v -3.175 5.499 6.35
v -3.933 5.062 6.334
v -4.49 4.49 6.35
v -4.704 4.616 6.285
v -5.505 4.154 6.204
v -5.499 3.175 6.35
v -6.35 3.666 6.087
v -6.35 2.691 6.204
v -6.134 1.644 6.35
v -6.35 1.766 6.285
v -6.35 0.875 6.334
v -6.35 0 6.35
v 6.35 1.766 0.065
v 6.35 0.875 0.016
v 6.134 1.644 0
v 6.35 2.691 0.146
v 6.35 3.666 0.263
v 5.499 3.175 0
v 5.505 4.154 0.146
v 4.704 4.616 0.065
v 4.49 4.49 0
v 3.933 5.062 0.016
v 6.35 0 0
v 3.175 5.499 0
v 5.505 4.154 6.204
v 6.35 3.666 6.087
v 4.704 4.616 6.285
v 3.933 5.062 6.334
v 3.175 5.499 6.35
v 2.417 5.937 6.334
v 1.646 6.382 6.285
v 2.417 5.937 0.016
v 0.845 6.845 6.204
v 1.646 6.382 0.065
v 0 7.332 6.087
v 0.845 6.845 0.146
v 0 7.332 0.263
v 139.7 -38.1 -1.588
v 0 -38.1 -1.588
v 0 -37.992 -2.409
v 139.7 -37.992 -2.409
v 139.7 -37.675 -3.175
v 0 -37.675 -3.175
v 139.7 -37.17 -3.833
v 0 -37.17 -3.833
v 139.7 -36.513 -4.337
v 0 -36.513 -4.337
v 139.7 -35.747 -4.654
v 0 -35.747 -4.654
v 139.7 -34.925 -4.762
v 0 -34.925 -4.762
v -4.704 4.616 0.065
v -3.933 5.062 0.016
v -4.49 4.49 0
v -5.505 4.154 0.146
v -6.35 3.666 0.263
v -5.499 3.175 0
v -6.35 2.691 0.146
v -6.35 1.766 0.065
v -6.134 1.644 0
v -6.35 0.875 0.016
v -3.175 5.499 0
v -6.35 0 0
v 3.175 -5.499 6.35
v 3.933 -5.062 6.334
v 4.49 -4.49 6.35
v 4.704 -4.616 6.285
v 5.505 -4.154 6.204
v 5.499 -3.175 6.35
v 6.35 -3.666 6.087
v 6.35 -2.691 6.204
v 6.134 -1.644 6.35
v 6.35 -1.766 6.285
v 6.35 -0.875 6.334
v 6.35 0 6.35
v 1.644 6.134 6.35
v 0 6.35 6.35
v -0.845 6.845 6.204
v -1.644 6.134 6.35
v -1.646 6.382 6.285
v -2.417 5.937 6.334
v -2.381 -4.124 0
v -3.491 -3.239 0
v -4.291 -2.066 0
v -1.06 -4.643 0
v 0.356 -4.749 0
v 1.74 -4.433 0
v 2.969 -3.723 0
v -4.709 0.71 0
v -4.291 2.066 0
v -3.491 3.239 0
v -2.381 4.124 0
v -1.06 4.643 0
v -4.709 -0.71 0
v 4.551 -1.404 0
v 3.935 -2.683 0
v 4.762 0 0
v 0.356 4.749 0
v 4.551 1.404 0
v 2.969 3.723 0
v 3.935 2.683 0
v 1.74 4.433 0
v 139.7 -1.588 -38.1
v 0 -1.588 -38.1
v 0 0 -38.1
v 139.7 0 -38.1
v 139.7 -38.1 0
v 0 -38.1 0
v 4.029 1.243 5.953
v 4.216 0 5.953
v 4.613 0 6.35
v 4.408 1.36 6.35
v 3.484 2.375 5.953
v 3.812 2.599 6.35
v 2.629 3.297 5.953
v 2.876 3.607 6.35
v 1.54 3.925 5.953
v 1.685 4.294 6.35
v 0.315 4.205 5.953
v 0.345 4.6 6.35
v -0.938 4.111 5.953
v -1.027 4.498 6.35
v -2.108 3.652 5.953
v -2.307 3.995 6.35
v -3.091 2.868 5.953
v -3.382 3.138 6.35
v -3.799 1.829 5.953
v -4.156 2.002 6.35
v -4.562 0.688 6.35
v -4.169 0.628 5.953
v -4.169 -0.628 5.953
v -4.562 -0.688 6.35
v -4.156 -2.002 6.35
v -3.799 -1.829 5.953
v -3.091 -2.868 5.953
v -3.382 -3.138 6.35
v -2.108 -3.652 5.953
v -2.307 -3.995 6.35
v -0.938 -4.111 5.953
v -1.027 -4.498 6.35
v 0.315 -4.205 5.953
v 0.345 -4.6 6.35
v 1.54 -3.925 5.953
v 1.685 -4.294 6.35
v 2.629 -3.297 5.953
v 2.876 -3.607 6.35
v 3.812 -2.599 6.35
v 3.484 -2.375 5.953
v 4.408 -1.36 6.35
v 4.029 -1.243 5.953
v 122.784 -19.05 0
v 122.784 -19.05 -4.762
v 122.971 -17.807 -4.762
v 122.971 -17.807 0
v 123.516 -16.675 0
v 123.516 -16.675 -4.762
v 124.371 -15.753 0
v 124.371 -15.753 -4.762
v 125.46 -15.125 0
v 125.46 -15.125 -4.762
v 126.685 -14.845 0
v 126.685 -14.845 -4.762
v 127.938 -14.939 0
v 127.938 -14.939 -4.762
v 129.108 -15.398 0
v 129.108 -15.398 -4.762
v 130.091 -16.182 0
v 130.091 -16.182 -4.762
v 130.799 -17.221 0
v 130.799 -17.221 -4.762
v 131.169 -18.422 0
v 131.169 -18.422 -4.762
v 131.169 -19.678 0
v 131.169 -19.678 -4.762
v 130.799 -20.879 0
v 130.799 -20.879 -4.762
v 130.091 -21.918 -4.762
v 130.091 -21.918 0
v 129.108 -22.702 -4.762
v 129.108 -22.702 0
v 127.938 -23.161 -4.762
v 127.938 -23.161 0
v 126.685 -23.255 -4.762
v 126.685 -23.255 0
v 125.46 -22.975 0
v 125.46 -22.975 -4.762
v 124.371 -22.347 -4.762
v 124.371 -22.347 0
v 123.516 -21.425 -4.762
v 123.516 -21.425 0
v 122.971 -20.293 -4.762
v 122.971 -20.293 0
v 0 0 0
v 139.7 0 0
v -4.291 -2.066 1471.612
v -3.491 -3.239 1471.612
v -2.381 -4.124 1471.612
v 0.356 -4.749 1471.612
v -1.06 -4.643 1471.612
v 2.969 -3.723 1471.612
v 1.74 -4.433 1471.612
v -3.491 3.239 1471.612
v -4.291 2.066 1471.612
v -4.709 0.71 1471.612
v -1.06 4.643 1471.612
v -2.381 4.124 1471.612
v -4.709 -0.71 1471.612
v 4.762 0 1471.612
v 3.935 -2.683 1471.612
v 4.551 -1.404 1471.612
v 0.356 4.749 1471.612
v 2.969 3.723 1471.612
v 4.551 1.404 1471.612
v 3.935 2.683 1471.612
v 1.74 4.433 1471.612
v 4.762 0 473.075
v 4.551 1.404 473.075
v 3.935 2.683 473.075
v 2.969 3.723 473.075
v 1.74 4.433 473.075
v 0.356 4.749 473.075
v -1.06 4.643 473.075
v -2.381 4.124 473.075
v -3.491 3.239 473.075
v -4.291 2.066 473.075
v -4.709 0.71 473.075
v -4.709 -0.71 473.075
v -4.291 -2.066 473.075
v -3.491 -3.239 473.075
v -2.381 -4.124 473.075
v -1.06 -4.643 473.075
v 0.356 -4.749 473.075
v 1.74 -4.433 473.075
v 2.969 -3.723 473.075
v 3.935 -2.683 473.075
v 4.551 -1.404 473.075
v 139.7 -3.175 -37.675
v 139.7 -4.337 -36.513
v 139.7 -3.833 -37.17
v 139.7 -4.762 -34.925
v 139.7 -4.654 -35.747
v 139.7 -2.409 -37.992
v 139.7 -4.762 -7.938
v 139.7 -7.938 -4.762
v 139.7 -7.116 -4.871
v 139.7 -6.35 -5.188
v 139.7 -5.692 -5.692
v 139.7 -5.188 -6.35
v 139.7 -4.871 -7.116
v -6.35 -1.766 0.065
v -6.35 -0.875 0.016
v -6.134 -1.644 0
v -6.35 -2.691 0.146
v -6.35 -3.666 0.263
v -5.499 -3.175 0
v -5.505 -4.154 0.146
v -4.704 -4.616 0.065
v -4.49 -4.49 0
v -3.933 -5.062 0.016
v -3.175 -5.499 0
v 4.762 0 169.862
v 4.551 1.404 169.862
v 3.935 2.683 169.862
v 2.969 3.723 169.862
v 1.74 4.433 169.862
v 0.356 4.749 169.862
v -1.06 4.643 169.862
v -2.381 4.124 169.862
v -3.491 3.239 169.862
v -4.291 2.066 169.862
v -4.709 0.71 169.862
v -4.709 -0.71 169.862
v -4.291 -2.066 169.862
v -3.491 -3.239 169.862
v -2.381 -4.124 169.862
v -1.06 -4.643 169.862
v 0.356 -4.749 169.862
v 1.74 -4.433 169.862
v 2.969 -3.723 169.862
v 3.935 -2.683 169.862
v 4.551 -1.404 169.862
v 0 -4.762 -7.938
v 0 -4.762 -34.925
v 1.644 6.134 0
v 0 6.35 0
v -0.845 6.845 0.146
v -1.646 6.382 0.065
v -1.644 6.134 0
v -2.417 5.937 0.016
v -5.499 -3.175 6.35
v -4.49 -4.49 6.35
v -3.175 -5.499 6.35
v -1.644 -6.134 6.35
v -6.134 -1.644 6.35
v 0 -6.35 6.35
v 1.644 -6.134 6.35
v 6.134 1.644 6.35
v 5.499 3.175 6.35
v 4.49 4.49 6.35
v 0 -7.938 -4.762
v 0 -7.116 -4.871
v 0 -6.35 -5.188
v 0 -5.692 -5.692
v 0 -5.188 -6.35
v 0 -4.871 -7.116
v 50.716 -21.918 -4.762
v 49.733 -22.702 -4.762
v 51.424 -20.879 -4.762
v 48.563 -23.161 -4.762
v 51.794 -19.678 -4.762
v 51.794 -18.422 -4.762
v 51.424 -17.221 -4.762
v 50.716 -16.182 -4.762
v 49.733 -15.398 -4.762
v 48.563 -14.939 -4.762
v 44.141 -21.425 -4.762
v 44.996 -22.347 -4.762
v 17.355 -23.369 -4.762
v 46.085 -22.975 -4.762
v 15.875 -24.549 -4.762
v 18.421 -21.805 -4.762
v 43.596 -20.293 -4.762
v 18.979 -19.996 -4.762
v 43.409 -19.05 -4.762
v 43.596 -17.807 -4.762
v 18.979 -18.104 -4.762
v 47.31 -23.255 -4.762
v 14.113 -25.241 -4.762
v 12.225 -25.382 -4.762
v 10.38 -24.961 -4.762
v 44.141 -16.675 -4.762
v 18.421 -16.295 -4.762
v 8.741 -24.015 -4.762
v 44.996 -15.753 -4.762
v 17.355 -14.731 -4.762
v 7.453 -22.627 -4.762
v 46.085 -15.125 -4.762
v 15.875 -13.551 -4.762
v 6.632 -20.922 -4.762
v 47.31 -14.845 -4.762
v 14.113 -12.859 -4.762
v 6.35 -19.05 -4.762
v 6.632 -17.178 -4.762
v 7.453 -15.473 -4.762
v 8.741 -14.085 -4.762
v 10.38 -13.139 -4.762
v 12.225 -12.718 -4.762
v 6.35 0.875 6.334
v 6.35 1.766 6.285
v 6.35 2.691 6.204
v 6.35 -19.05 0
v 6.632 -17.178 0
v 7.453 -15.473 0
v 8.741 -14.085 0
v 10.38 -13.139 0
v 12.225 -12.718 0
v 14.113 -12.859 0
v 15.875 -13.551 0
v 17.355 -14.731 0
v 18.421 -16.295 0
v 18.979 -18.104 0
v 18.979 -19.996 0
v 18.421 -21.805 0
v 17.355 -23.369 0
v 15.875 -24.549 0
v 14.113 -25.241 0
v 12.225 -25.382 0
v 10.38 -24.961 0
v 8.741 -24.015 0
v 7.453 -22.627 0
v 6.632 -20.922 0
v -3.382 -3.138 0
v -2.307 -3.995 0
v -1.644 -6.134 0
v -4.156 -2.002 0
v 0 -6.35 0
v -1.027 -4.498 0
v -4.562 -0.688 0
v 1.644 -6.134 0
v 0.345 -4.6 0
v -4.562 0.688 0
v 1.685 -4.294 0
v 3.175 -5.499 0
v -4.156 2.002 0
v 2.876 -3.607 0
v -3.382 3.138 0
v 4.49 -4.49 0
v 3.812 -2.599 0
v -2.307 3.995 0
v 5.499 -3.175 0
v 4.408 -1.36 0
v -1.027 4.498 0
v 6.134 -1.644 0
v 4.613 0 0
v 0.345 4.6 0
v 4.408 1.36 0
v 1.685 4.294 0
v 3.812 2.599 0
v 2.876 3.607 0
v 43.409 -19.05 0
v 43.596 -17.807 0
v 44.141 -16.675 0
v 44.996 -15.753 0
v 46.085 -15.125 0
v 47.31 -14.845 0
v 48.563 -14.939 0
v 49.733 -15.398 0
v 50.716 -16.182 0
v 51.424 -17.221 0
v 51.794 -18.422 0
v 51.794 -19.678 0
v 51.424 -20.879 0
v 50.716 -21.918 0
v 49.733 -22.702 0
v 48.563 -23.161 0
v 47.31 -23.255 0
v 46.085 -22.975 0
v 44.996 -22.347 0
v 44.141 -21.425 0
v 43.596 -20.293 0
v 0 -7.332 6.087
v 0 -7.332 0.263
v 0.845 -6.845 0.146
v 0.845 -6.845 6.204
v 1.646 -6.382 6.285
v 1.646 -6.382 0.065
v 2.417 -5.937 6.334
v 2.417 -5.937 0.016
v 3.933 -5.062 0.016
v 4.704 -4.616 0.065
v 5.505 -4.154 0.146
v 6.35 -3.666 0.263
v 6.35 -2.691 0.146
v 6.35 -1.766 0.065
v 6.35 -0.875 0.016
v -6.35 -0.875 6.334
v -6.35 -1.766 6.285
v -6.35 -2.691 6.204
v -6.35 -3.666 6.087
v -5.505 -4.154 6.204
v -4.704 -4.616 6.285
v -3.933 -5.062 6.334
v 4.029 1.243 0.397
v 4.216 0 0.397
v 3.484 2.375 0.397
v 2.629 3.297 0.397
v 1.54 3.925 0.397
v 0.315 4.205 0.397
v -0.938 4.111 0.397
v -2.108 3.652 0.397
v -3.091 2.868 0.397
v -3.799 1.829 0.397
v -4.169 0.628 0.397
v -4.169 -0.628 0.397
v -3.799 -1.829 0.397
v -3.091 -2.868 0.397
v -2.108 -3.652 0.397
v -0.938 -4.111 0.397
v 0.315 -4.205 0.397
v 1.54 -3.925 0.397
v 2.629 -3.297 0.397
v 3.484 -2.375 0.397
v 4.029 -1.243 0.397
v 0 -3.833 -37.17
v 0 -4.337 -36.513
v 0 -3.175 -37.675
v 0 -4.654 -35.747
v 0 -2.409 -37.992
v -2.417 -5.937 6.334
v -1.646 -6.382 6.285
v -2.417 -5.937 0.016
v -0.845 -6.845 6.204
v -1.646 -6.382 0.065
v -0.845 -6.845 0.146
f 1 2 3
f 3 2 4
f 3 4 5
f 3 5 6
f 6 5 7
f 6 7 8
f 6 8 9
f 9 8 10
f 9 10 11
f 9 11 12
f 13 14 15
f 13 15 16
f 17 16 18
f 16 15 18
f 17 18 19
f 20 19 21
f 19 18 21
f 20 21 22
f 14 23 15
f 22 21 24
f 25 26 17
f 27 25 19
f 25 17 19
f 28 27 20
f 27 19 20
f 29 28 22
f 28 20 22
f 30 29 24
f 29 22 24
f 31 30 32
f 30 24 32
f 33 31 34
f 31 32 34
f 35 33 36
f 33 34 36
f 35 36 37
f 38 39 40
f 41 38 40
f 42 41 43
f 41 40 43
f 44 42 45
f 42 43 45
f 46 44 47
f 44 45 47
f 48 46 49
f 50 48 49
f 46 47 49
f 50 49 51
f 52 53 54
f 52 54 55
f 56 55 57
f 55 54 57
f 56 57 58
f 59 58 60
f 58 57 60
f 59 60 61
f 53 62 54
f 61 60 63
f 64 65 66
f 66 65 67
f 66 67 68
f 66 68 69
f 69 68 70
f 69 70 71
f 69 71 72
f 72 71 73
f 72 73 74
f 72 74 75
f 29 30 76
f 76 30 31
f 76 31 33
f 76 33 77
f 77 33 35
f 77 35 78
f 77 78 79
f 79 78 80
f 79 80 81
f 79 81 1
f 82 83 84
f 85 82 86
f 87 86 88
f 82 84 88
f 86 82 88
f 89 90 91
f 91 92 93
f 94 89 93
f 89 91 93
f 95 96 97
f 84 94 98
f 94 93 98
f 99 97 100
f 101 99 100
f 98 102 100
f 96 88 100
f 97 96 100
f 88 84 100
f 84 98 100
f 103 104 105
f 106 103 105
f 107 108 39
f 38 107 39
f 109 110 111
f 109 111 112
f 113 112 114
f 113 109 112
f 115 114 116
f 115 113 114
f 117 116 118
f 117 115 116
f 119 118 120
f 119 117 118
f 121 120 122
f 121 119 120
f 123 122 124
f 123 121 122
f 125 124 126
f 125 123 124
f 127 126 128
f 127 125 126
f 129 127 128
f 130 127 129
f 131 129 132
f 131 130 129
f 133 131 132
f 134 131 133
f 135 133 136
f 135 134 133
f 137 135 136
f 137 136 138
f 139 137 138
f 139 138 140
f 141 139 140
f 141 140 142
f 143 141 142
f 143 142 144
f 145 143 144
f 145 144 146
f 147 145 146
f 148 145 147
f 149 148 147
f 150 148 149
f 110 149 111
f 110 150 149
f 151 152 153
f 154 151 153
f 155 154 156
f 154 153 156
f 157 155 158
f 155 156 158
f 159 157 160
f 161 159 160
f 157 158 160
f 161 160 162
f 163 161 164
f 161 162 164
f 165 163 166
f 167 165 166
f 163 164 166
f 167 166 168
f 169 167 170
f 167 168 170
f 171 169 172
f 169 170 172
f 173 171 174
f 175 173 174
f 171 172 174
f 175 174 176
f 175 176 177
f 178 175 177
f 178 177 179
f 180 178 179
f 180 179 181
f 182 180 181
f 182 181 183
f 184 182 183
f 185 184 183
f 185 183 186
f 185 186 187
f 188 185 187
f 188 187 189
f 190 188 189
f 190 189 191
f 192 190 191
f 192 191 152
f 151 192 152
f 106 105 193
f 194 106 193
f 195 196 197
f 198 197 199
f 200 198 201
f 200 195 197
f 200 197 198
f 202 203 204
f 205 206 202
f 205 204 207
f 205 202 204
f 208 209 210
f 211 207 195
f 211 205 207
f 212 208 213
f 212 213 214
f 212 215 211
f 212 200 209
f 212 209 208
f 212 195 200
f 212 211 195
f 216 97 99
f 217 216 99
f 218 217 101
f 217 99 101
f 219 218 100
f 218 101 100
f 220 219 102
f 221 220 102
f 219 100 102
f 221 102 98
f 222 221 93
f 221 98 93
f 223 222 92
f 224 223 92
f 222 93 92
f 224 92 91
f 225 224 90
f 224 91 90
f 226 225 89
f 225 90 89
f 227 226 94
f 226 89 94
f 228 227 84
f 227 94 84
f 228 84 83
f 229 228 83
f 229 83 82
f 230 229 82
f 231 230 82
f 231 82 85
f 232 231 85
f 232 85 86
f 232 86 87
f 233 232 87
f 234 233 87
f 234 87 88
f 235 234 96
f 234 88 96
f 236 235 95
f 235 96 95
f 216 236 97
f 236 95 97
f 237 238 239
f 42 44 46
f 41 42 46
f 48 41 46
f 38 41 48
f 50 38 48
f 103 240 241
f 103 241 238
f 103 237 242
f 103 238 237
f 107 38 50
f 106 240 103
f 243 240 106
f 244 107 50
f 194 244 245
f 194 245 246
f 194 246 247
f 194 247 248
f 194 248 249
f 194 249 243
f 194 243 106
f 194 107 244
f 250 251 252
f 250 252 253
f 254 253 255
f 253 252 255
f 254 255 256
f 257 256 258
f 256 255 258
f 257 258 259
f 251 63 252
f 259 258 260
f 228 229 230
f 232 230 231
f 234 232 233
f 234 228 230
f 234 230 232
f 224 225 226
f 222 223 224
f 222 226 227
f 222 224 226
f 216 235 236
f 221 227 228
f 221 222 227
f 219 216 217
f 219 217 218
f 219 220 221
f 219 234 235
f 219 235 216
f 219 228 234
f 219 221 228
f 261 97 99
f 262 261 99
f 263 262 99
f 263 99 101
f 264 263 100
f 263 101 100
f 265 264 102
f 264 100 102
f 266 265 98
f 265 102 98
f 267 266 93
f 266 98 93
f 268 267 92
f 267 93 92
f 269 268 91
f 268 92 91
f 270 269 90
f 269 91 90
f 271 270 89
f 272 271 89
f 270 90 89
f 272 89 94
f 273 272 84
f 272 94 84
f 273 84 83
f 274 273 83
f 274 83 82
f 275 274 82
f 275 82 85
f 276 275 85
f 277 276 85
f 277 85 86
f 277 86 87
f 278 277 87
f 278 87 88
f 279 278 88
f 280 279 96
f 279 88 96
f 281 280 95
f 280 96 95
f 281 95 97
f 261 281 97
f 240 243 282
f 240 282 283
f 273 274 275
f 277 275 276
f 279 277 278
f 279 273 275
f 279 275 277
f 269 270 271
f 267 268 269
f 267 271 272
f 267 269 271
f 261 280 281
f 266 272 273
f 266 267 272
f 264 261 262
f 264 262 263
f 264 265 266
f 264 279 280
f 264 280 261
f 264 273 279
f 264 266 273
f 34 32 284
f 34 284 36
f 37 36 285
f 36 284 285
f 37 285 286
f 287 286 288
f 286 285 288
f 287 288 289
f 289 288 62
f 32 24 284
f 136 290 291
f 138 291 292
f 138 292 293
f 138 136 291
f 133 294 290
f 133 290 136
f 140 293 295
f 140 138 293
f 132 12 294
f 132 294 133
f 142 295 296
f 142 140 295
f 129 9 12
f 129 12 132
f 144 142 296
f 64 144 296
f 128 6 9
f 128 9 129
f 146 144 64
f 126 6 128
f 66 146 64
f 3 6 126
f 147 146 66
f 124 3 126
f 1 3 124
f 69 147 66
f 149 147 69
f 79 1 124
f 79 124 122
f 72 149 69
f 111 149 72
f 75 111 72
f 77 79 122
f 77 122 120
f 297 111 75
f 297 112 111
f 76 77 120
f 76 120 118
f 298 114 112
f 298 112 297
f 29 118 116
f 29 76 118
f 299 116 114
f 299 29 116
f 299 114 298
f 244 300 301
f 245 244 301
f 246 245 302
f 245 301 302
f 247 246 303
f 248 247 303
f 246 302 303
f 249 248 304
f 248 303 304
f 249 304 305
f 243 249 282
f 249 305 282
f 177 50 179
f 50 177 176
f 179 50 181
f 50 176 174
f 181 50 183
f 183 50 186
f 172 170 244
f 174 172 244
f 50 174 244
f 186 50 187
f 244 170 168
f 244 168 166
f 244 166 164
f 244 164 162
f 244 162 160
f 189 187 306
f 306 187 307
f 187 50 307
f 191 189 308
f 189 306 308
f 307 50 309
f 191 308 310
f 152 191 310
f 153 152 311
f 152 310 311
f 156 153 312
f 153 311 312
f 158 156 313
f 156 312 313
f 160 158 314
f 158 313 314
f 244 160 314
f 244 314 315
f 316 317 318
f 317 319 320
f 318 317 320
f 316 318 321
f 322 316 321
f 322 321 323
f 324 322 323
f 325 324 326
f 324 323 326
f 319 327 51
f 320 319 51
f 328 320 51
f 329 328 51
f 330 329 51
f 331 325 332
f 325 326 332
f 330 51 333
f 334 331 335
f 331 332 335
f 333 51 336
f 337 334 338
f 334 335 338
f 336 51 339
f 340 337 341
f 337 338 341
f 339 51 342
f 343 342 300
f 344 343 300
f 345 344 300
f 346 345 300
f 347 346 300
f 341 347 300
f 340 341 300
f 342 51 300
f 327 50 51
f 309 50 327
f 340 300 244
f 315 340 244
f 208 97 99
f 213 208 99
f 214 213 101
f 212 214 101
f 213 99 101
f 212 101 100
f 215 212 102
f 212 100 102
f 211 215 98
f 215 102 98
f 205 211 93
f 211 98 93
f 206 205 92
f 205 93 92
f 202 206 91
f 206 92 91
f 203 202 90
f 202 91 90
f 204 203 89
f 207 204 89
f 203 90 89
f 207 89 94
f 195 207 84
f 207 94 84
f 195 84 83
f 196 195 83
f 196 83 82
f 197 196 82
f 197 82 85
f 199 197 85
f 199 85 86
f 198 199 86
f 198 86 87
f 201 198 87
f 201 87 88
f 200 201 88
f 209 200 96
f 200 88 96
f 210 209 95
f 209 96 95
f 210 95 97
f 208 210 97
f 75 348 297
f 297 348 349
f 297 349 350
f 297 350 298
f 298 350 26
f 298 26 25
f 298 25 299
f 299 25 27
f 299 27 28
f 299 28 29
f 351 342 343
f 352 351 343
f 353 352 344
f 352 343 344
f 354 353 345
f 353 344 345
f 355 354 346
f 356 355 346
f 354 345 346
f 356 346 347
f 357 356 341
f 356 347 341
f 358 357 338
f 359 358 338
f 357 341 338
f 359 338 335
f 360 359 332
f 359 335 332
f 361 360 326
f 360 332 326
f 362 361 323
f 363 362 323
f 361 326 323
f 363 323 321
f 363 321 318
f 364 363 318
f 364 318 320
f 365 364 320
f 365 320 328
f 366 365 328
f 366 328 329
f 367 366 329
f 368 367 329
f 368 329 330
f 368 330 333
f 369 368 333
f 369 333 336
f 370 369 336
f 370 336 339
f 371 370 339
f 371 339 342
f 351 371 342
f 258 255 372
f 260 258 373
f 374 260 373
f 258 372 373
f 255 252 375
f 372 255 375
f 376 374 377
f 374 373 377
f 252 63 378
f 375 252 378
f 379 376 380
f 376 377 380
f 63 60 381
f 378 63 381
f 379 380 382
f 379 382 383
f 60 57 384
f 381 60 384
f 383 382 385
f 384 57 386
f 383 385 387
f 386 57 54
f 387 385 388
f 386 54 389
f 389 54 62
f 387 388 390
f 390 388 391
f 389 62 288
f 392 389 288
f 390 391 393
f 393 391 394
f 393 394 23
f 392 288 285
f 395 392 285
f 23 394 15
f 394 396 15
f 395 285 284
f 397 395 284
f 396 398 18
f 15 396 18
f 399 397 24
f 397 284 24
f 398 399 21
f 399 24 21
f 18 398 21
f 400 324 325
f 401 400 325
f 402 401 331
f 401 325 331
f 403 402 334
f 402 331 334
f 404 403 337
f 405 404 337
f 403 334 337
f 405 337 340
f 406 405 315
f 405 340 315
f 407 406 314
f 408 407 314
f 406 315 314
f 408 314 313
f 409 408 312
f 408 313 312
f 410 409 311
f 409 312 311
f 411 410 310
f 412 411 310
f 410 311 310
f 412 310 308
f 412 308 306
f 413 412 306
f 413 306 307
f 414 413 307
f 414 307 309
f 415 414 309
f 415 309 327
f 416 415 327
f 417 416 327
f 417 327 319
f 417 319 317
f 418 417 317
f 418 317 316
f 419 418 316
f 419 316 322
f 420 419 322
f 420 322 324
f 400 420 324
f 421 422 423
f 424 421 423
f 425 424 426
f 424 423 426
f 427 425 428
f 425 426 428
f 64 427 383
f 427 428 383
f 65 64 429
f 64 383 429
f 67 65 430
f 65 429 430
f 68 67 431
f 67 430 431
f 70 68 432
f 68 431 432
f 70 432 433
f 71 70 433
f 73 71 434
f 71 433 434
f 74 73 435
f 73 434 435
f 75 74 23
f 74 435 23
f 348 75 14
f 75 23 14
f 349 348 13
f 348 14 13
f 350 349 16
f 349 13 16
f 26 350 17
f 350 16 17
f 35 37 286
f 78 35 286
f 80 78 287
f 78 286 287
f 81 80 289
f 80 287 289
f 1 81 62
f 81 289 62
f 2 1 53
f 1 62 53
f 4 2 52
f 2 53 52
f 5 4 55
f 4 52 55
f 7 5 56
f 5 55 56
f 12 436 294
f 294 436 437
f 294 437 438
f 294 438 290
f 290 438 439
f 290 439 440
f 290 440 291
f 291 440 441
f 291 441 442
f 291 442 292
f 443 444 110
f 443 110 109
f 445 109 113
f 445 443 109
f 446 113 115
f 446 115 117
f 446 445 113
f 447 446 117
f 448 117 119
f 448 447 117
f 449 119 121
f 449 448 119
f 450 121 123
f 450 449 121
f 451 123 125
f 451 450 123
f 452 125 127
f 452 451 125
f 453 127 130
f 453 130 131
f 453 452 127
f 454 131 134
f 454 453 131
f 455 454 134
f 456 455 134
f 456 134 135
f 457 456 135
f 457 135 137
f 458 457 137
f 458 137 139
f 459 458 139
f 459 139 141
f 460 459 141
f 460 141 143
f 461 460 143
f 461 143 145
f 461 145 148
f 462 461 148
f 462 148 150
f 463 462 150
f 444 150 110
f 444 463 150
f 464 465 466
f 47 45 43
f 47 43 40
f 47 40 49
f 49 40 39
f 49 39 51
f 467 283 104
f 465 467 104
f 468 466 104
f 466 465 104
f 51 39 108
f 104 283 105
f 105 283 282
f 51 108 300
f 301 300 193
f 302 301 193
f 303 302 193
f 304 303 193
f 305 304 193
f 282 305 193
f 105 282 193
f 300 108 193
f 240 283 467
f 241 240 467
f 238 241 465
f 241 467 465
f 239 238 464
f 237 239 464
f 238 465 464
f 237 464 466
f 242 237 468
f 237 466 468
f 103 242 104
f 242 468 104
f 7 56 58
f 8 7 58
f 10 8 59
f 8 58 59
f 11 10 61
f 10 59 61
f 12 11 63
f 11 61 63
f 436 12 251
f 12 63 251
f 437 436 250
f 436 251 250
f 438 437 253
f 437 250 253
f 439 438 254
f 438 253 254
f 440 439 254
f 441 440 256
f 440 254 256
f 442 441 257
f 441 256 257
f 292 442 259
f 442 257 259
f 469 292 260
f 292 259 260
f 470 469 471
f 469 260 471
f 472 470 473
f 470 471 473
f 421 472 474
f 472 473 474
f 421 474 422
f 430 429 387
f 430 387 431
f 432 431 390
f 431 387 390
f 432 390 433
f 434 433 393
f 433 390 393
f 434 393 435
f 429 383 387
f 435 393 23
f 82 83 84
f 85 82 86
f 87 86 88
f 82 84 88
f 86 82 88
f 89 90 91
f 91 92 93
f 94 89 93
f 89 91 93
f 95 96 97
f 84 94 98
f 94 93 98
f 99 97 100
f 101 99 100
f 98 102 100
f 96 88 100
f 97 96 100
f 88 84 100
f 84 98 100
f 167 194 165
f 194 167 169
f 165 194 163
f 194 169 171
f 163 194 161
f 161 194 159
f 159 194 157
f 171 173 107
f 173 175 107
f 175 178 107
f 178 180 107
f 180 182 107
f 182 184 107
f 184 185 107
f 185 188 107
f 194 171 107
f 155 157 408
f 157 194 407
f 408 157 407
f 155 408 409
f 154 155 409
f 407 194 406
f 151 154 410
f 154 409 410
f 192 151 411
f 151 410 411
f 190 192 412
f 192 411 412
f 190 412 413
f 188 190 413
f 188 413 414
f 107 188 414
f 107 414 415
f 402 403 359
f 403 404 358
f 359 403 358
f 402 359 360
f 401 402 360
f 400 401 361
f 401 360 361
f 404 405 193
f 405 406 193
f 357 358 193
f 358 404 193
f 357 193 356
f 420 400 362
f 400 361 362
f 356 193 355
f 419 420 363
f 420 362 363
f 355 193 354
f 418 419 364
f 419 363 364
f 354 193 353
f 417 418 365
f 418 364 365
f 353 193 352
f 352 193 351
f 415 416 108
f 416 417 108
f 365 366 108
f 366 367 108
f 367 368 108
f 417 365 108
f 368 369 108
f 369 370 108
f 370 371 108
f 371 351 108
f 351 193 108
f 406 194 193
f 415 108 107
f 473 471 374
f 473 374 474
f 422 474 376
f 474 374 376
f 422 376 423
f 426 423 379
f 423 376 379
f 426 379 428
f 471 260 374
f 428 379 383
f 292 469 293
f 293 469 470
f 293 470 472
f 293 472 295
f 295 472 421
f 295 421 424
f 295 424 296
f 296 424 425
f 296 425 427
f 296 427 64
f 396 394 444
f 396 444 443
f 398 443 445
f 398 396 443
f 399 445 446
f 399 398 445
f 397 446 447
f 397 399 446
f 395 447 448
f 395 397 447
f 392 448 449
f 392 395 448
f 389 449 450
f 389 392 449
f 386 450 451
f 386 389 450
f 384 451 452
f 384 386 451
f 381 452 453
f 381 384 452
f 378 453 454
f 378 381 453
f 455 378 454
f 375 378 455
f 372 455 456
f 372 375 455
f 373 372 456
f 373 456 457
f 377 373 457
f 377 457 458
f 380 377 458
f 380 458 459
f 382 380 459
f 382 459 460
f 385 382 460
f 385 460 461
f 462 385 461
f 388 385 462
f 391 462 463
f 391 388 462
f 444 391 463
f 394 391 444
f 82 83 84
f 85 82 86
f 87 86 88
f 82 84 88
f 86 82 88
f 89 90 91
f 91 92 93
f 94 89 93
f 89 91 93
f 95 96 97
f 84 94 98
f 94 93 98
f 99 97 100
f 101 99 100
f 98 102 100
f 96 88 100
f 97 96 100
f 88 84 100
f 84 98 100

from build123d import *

# Parameters (mm, degrees)
F1_DEPTH  = 139.7
F3_D      = 8.4328
F4_D      = 12.7
F5_R      = 4.7625
F6_DEPTH  = 169.8625
F7_DEPTH  = 1471.6125
F8_DEPTH  = 473.075
F9_R      = 4.2164
F10_DEPTH = 6.35
F13_SIZE2 = 0.396875
F13_SIZE  = 0.396875


# Not quite as in the source:
# - a length typed as a fraction of an inch, garbled in the dataset ("3 / 203.2 mm" for 3/8 in), is restored


with BuildPart() as f1:
    # F0 (on Right) → F1 (new body)
    with BuildSketch(Plane.YZ):
        with BuildLine():
            Line((0, -38.1), (0, 0))
            Line((0, 0), (-38.1, 0))
            Line((-38.1, 0), (-38.1, -1.5875))
            ThreePointArc((-38.1, -1.5875), (-37.1700640303, -3.8325640303), (-34.925, -4.7625))
            Line((-34.925, -4.7625), (-7.9375, -4.7625))
            ThreePointArc((-7.9375, -4.7625), (-5.6924359697, -5.6924359697), (-4.7625, -7.9375))
            Line((-4.7625, -7.9375), (-4.7625, -34.925))
            ThreePointArc((-4.7625, -34.925), (-3.8325640303, -37.1700640303), (-1.5875, -38.1))
            Line((-1.5875, -38.1), (0, -38.1))
        make_face()
    extrude(amount=F1_DEPTH)

    # F3 (through all)
    with Locations(Plane.XY):
        with Locations((47.625, -19.05), (127, -19.05)):
            Hole(F3_D / 2)

    # F4 (through all)
    with Locations(Plane.XY):
        with Locations((12.7, -19.05)):
            Hole(F4_D / 2)


with BuildPart() as f6:
    # F5 (on Top) → F6 (new body)
    with BuildSketch(Plane.XY):
        Circle(F5_R)
    extrude(amount=F6_DEPTH)


with BuildPart() as f7:
    # F5 (on Top) → F7 (new body)
    with BuildSketch(Plane.XY):
        Circle(F5_R)
    extrude(amount=F7_DEPTH)


with BuildPart() as f8:
    # F5 (on Top) → F8 (new body)
    with BuildSketch(Plane.XY):
        Circle(F5_R)
    extrude(amount=F8_DEPTH)


with BuildPart() as f10:
    # F9 (on Top) → F10 (new body)
    with BuildSketch(Plane.XY):
        Polygon((6.35, -3.6661742094), (6.35, 3.6661742094), (0, 7.3323484187), (-6.35, 3.6661742094), (-6.35, -3.6661742094), (0, -7.3323484187), align=None)
        Circle(F9_R, mode=Mode.SUBTRACT)
    extrude(amount=F10_DEPTH)

    # F11 (on Right) → F12 (revolve, cut)
    with BuildSketch(Plane.YZ):
        Polygon((7.9375, 6.35), (6.35, 6.35), (7.9375, 5.924630657), align=None)
        Polygon((7.9375, 0.425369343), (6.35, 0), (7.9375, 0), align=None)
    revolve(axis=Axis((0, 0, 2.923237852), (0, 0, 1)), mode=Mode.SUBTRACT)

    # F13
    f13_edges = [f10.edges().sort_by_distance(p)[0] for p in [
        (-4.2164, 0, 6.35),
        (-4.2164, 0, 0),
    ]]
    chamfer(f13_edges, length=F13_SIZE, length2=F13_SIZE2)


solid = Compound([f1.part, f6.part, f7.part, f8.part, f10.part])
